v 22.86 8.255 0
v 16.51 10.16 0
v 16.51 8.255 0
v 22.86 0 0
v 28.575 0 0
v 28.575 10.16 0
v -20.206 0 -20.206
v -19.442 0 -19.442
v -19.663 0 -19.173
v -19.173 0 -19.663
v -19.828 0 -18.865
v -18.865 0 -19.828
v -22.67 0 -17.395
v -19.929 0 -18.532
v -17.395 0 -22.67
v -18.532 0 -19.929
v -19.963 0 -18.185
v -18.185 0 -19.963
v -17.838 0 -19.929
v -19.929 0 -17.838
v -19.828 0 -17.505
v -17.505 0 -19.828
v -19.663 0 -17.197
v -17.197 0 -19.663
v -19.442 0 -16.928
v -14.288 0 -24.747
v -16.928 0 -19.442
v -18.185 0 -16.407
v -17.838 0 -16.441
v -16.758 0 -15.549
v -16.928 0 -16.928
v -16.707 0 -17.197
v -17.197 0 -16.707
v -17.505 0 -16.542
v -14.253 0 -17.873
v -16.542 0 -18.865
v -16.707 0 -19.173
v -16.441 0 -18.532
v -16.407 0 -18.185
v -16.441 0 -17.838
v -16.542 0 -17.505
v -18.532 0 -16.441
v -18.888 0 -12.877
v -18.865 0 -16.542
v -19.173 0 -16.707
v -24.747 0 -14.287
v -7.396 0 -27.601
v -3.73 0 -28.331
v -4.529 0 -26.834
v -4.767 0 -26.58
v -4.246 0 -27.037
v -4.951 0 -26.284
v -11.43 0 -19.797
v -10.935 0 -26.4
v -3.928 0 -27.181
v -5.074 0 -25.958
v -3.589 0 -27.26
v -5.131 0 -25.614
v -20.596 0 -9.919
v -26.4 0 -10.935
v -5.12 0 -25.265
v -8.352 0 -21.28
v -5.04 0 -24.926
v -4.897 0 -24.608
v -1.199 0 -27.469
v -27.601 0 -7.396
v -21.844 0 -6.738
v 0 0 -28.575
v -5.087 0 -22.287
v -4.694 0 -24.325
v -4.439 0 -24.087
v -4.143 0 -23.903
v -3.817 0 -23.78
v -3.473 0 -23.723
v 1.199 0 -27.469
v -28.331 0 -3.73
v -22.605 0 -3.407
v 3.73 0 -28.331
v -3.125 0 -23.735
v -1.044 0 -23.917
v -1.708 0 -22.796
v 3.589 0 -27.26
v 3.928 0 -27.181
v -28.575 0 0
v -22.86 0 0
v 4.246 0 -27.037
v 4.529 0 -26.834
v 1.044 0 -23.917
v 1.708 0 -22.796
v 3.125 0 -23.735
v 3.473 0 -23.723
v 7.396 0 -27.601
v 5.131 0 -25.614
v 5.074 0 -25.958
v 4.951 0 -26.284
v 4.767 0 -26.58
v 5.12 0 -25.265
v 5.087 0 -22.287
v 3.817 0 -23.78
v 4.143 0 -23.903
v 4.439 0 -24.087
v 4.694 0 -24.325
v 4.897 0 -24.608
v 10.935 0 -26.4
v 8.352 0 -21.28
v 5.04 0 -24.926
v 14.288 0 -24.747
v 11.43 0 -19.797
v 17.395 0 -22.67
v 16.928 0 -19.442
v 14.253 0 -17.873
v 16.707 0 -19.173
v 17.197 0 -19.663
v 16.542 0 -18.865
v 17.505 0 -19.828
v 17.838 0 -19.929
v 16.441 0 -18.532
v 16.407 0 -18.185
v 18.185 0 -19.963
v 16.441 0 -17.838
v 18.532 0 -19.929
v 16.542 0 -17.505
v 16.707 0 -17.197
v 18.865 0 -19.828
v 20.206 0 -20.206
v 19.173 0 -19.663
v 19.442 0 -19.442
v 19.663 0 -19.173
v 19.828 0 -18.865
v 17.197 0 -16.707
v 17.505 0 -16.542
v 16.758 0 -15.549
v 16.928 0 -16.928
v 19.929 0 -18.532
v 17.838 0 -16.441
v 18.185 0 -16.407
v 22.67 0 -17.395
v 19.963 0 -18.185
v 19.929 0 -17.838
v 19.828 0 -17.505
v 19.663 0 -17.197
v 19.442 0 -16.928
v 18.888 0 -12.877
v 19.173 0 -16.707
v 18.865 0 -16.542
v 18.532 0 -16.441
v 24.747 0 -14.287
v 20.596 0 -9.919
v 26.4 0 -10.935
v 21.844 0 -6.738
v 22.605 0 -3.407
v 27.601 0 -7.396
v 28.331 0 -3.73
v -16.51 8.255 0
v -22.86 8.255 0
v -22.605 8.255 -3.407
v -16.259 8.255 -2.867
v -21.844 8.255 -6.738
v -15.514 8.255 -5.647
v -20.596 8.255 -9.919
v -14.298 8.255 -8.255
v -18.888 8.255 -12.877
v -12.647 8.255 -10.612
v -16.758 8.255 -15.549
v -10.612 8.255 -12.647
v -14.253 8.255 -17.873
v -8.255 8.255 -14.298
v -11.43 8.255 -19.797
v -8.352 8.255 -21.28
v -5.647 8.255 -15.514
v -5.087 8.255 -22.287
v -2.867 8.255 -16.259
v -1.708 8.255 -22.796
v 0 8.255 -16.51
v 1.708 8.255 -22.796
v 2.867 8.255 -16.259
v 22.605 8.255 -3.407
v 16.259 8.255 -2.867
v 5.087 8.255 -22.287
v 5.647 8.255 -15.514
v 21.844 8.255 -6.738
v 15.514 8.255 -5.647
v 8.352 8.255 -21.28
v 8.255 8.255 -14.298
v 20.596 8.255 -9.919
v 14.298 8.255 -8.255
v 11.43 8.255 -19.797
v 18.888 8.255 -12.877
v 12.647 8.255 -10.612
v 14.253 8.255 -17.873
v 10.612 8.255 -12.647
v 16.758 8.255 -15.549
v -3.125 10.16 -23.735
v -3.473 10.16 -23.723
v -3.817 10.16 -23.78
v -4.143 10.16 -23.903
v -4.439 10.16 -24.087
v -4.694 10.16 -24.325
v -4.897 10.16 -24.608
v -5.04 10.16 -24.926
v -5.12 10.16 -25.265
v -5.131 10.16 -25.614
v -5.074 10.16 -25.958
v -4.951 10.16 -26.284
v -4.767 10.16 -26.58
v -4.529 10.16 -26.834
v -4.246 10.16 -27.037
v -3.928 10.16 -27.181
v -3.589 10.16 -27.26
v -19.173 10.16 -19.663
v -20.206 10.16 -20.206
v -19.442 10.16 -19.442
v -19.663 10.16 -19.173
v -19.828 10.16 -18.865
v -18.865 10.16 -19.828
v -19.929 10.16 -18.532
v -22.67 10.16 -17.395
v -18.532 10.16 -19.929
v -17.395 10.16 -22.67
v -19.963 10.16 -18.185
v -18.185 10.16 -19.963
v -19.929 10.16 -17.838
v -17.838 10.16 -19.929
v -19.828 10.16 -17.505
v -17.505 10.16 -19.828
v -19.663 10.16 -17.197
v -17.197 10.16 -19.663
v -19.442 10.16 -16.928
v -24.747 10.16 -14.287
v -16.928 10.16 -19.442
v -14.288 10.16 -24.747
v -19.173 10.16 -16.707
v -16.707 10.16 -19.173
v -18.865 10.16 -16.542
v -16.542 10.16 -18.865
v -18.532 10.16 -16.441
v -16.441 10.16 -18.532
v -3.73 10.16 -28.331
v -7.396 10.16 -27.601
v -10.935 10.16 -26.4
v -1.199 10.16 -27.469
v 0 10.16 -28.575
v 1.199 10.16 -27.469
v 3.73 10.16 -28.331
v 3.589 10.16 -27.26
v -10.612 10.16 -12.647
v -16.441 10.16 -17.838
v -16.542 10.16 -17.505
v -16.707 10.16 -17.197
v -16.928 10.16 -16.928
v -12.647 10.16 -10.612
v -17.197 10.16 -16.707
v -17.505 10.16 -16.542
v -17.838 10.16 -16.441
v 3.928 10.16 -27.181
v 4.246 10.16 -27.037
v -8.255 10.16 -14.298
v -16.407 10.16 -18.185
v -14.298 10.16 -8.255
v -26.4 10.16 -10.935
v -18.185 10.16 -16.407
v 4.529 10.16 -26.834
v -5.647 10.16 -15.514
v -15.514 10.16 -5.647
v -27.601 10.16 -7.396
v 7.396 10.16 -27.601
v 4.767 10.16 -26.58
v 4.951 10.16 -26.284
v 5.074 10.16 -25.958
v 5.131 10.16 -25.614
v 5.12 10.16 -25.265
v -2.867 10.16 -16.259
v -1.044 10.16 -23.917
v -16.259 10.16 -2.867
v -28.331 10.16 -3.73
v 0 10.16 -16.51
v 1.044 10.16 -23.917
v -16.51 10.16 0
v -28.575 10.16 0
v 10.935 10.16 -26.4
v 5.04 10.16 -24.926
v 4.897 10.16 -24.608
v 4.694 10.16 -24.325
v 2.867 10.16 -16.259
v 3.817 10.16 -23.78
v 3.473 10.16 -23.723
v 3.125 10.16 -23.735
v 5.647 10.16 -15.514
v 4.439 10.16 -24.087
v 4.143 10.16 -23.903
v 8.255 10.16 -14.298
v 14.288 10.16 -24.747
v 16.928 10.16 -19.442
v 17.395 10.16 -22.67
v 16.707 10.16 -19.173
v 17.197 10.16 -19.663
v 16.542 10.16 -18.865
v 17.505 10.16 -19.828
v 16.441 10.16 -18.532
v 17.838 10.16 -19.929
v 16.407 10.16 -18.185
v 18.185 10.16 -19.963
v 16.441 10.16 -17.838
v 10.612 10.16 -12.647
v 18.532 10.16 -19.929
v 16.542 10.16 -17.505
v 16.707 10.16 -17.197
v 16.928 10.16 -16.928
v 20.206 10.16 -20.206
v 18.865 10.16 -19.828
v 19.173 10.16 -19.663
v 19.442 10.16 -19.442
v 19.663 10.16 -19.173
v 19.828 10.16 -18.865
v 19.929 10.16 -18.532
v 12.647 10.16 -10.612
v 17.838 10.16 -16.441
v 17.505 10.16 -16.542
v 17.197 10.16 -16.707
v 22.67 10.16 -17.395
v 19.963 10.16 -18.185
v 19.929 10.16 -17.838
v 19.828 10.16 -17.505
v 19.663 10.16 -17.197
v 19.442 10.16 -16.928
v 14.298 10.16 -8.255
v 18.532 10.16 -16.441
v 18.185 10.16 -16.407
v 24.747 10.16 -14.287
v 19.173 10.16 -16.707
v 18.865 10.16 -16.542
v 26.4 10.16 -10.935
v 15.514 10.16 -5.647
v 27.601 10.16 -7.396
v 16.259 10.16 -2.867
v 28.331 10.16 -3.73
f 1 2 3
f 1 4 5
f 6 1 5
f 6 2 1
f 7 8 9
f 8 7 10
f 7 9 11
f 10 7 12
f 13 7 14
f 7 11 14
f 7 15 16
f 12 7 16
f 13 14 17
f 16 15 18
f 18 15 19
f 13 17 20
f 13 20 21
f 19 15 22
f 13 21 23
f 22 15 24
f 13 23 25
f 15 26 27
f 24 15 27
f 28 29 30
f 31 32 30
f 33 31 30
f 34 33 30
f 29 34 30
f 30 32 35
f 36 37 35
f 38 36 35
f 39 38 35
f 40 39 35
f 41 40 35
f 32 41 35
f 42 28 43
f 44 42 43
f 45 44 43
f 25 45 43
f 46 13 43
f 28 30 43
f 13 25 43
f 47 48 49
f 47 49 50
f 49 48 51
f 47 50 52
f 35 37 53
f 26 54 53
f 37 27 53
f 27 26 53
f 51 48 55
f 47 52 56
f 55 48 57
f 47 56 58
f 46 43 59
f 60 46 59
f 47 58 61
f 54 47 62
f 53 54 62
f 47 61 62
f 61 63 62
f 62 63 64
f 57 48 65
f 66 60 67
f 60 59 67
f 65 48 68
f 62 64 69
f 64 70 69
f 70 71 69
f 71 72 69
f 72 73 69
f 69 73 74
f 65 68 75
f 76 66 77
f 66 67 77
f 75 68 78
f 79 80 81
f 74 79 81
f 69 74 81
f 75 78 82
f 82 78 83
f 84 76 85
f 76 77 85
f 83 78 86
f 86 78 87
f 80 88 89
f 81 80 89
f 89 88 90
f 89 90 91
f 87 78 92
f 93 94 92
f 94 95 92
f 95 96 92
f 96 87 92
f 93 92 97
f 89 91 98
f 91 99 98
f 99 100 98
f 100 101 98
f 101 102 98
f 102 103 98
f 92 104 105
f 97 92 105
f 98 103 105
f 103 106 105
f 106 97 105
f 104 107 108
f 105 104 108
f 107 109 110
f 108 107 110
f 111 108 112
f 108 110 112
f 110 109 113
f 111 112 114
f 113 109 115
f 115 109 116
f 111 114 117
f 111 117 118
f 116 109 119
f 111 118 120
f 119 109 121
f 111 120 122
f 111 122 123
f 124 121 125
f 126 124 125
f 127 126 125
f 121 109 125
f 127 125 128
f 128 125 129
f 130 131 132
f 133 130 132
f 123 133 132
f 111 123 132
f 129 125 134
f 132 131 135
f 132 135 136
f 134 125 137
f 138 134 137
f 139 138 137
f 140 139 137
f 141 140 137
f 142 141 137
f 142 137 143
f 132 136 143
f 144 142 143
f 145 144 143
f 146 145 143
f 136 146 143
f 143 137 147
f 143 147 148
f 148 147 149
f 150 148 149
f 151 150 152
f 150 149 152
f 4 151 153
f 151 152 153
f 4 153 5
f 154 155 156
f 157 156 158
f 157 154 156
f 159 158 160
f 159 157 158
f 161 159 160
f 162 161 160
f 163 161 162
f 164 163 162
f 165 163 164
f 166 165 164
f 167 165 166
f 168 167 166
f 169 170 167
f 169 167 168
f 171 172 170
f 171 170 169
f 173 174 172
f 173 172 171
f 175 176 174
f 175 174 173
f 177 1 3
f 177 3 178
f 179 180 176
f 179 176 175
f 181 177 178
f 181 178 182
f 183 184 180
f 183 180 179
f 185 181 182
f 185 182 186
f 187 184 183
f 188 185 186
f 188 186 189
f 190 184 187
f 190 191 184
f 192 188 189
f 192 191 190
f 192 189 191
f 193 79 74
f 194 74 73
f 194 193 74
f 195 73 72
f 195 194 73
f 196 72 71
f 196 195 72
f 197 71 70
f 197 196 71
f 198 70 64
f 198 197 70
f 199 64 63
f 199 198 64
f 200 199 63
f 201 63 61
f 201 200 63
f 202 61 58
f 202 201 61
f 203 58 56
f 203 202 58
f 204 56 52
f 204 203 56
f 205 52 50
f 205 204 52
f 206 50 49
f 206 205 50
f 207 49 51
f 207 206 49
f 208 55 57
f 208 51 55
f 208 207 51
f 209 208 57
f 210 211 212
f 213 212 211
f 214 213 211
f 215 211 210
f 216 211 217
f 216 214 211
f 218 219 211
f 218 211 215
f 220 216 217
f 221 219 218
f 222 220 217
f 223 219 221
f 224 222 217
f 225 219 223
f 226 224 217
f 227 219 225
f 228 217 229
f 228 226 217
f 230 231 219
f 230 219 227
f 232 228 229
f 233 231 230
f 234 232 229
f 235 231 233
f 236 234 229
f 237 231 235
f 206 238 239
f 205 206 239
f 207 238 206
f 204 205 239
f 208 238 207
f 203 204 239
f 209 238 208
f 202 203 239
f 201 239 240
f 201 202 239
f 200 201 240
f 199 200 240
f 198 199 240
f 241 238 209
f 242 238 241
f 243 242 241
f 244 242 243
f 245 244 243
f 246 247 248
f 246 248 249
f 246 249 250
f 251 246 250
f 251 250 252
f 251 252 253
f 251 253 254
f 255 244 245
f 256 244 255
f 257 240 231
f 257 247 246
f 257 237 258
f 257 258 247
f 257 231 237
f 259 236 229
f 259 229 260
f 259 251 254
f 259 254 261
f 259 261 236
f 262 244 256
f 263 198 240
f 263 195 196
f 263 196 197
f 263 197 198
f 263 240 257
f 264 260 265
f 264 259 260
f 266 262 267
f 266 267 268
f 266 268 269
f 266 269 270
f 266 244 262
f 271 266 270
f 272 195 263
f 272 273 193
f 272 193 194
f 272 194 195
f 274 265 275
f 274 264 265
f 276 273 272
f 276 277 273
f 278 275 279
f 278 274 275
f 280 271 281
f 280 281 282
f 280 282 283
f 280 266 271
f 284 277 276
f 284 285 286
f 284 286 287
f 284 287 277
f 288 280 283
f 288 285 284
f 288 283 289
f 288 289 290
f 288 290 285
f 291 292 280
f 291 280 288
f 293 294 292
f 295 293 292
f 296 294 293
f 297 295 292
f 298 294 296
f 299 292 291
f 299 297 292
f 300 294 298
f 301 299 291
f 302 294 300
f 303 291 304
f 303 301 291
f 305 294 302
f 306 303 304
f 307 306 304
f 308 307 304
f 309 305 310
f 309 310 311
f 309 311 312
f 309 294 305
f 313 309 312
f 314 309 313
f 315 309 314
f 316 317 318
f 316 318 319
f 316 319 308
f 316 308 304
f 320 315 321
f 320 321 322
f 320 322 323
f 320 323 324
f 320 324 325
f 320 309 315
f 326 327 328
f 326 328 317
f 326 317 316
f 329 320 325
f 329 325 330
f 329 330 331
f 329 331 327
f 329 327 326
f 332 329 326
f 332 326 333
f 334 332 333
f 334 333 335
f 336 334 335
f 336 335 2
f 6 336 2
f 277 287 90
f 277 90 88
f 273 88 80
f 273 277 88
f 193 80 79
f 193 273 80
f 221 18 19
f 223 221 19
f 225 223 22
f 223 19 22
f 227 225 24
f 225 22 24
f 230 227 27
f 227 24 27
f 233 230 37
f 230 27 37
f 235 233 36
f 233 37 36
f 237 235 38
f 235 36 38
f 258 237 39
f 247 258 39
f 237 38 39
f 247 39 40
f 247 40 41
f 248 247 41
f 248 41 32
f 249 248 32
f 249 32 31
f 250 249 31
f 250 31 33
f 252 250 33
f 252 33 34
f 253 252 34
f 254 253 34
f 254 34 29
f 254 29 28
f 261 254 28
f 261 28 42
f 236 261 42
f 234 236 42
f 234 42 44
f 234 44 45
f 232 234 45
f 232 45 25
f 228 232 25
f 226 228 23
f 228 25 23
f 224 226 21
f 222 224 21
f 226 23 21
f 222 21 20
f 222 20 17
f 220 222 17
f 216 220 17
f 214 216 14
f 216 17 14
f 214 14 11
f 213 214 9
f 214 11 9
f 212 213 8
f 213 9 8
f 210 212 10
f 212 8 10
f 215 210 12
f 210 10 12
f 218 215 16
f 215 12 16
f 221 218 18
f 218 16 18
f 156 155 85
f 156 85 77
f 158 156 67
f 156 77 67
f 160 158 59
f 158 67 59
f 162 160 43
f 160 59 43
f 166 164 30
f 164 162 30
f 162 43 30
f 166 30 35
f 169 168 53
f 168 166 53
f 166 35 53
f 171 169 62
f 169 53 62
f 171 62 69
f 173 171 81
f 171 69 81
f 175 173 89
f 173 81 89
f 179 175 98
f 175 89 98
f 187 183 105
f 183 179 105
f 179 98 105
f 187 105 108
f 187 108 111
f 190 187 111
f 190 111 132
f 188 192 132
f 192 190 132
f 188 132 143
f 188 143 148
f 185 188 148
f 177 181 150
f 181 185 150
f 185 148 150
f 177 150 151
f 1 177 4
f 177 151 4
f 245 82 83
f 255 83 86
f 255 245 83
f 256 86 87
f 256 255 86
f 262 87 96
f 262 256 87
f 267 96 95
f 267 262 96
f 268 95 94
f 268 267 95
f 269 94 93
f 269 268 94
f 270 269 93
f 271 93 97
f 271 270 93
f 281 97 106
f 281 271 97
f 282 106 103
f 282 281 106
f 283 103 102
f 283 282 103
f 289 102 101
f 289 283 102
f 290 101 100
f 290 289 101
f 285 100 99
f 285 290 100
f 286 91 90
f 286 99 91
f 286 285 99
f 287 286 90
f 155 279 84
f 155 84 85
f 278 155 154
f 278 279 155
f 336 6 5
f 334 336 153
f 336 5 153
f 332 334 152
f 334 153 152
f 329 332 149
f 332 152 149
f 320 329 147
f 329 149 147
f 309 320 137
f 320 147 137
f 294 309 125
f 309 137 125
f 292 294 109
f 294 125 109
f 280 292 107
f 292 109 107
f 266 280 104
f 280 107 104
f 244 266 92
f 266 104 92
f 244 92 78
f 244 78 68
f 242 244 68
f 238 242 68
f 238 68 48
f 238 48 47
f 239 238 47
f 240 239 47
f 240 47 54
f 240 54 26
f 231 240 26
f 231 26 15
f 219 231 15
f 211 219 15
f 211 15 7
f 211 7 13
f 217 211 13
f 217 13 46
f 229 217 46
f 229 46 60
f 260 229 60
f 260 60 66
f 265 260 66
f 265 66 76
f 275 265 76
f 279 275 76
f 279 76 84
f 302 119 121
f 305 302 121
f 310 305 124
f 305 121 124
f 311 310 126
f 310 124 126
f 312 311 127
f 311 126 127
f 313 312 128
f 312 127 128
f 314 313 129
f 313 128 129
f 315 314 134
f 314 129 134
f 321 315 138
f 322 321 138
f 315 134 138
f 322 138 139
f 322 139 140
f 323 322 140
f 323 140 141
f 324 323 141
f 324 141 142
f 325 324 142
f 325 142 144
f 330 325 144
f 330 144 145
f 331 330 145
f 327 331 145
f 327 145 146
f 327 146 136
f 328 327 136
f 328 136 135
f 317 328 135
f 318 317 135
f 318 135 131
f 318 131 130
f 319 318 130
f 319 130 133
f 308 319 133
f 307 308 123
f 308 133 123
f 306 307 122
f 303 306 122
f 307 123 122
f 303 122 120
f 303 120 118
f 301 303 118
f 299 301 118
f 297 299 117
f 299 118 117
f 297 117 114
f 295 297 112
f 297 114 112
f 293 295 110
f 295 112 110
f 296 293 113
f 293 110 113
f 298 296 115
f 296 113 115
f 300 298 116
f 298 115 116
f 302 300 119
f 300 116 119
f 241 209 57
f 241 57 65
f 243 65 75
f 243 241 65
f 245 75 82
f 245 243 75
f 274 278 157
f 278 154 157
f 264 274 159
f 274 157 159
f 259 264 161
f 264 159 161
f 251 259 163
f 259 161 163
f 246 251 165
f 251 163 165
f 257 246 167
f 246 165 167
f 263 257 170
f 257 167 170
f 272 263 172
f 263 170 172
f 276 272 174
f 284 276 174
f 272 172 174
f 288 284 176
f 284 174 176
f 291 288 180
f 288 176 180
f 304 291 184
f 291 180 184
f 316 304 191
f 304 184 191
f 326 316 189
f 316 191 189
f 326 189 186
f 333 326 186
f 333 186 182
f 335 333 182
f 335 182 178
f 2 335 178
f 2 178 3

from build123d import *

# Parameters (mm, degrees)
SKETCH1_R           = 28.575
BOSS_EXTRUDE1_DEPTH = 10.16
SKETCH2_R           = 16.51
CUT_EXTRUDE1_DEPTH  = 42.66877548
SKETCH3_R           = 22.86
CUT_EXTRUDE2_DEPTH  = 8.255
SKETCH4_W           = 88.915115744
SKETCH4_H           = 51.352535237
CUT_EXTRUDE3_DEPTH  = 42.66877548
CUT_EXTRUDE4_REACH  = 43.669
SKETCH6_R           = 1.778
CUT_EXTRUDE5_DEPTH  = 42.66877548


with BuildPart() as part:
    # Sketch1 → Boss-Extrude1 (new body)
    with BuildSketch(Plane(origin=(0, 0, 0), x_dir=(1, 0, 0), z_dir=(0, 1, 0))):
        with Locations(Location((0, 0, 0), (0, 0, 270))):
            Circle(SKETCH1_R)
    extrude(amount=BOSS_EXTRUDE1_DEPTH)

    # Sketch2 → Cut-Extrude1 (cut, through all)
    with BuildSketch(Plane.XZ):
        with Locations(Location((0, 0, 0), (0, 0, 270))):
            Circle(SKETCH2_R)
    extrude(amount=-CUT_EXTRUDE1_DEPTH, mode=Mode.SUBTRACT)

    # Sketch3 → Cut-Extrude2 (cut)
    with BuildSketch(Plane.XZ):
        with Locations(Location((0, 0, 0), (0, 0, 270))):
            Circle(SKETCH3_R)
    extrude(amount=-CUT_EXTRUDE2_DEPTH, mode=Mode.SUBTRACT)

    # Sketch4 → Cut-Extrude3 (cut, through all)
    with BuildSketch(Plane(origin=(0, 10.16, 0), x_dir=(1, 0, 0), z_dir=(0, 1, 0))):
        with Locations((4.883047594, -25.676267619)):
            Rectangle(SKETCH4_W, SKETCH4_H)
    extrude(amount=-CUT_EXTRUDE3_DEPTH, mode=Mode.SUBTRACT)

    # Sketch6 → Cut-Extrude4 (cut, up to next)
    with BuildSketch(Plane.XZ, mode=Mode.PRIVATE) as cut_extrude4_sk1:
        with Locations(Location((18.185018645, -18.185018645, 0), (0, 0, 270))):
            Circle(SKETCH6_R)
    cut_extrude4_tool1 = extrude(cut_extrude4_sk1.sketch, amount=-CUT_EXTRUDE4_REACH, mode=Mode.PRIVATE) & part.part
    # Sketch6 → Cut-Extrude4 (cut, up to next)
    with BuildSketch(Plane.XZ, mode=Mode.PRIVATE) as cut_extrude4_sk2:
        with Locations(Location((-18.185018645, -18.185018645, 0), (0, 0, 270))):
            Circle(SKETCH6_R)
    cut_extrude4_tool2 = extrude(cut_extrude4_sk2.sketch, amount=-CUT_EXTRUDE4_REACH, mode=Mode.PRIVATE) & part.part
    add(cut_extrude4_tool1.solids().sort_by_distance((18.185019, 0, -18.185019))[0], mode=Mode.SUBTRACT)
    add(cut_extrude4_tool2.solids().sort_by_distance((-18.185019, 0, -18.185019))[0], mode=Mode.SUBTRACT)

    # Sketch7 → Cut-Extrude5 (cut, through all)
    with BuildSketch(Plane(origin=(0, 10.16, 0), x_dir=(1, 0, 0), z_dir=(0, 1, 0))):
        with BuildLine():
            ThreePointArc((3.124731779, 23.734694259), (0, 23.9395), (-3.124731779, 23.734694259))
            ThreePointArc((-3.124731779, 23.734694259), (-5.119596312, 25.265407653), (-3.588882918, 27.260272186))
            ThreePointArc((-3.588882918, 27.260272186), (0, 27.4955), (3.588882918, 27.260272186))
            ThreePointArc((3.588882918, 27.260272186), (5.119596312, 25.265407653), (3.124731779, 23.734694259))
        make_face()
    extrude(amount=-CUT_EXTRUDE5_DEPTH, mode=Mode.SUBTRACT)


solid = part.part
